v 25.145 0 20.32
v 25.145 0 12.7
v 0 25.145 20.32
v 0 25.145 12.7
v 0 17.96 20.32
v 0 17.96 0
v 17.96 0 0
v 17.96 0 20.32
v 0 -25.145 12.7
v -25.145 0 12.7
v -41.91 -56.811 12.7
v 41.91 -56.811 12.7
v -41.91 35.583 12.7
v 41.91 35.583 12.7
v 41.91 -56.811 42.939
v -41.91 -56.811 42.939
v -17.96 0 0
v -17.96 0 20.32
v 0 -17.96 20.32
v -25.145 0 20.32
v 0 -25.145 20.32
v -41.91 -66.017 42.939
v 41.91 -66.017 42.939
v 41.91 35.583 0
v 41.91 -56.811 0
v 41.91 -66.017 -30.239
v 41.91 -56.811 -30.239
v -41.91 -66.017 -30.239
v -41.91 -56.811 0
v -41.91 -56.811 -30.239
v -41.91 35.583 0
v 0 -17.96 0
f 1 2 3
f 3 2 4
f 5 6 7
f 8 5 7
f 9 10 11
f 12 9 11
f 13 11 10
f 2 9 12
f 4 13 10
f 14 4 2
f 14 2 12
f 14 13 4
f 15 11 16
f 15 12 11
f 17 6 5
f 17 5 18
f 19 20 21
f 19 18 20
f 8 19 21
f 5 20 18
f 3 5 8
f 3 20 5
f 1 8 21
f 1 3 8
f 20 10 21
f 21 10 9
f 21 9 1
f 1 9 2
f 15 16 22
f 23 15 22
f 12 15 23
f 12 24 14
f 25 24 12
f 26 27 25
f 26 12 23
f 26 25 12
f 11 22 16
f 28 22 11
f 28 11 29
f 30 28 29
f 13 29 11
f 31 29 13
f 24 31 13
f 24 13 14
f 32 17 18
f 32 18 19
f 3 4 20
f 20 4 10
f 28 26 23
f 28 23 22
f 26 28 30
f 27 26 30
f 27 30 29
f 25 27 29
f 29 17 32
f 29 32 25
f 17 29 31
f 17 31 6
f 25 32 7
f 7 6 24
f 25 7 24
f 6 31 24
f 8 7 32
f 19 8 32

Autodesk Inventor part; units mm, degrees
ref_plane "YZ Plane" through (0, 0, 0) normal (1, 0, 0) x (0, 1, 0)
ref_plane "XZ Plane" through (0, 0, 0) normal (0, 1, 0) x (-1, 0, 0)
ref_plane "XY Plane" through (0, 0, 0) normal (0, 0, 1) x (1, 0, 0)
sketch "Sketch1" plane through (0, 0, 0) normal (0, 0, 1) x (1, 0, 0)
  line L0 (0, 17.9605) -> (17.9605, 0) construction
  line L1 (17.9605, 0) -> (0, -17.9605) construction
  line L2 (0, -17.9605) -> (-17.9605, 0) construction
  line L3 (-17.9605, 0) -> (0, 17.9605) construction
  line L4 (0, 17.9605) -> (0, -17.9605) construction
  line L5 (17.9605, 0) -> (-17.9605, 0) construction
  line L6 (0, 17.9605) -> (-17.9605, 0)
  line L7 (0, -86.3372) -> (0, 55.9028) projected
  line L8 (-58.674, 0) -> (58.674, 0) projected
  line L9 (0, 17.9605) -> (17.9605, 0)
  line L10 (17.9605, 0) -> (0, -17.9605)
  line L11 (-17.9605, 0) -> (0, -17.9605)
  line L12 (0, 25.1447) -> (-25.1447, 0)
  line L13 (-25.1447, 0) -> (0, -25.1447)
  line L14 (0, -25.1447) -> (25.1447, 0)
  line L15 (25.1447, 0) -> (0, 25.1447)
  line L16 (-41.91, 35.5828) -> (41.91, 35.5828)
  line L17 (41.91, 35.5828) -> (41.91, -66.0172)
  line L18 (41.91, -66.0172) -> (-41.91, -66.0172)
  line L19 (-41.91, -66.0172) -> (-41.91, 35.5828)
  point P0 (0, 0)
  point P1 (0, 0)
  point P2 (0, 0)
  point P3 (0, 0)
  point P4 (0, 0)
  point P5 (29.7157, 21.8287)
  point P6 (0, 35.5828)
  dimension "d0" = 25.4
  dimension "d1" = 25.4
  dimension "d5" = 0
  dimension "d6" = 5.08
  dimension "d7" = 5.08
  dimension "d15" = 83.82
  dimension "d16" = 101.6
extrude "Extrusion2" add sketch "Sketch1" along normal blind 20.32 contours L6 L8 L12 L7 | L7 L15 L8 L9 | L11 L7 L13 L8 | L8 L14 L7 L10
extrude "Extrusion3" add sketch "Sketch1" along normal blind 12.7 contours L12 L8 L19 L16 L7 | L7 L16 L17 L8 L15 | L13 L7 L18 L19 L8 | L8 L17 L18 L7 L14
sketch "Sketch2" plane through (41.91, -66.0172, 0) normal (1, 0, 0) x (0, 0, -1)
  line L0 (0, 0) -> (0, 101.6) projected
  line L1 (0, 101.6) -> (-12.7, 101.6) projected
  line L2 (-12.7, 0) -> (-12.7, 101.6) projected
  line L3 (0, 0) -> (-12.7, 0) projected
  line L4 (-42.9388, 0) -> (30.2388, 0)
  line L5 (30.2388, 0) -> (30.2388, 9.2066)
  line L6 (30.2388, 9.2066) -> (-42.9388, 9.2066)
  line L7 (-42.9388, 9.2066) -> (-42.9388, 0)
  line L8 (-42.9388, 0) -> (30.2388, 9.2066) construction
  line L9 (30.2388, 0) -> (-42.9388, 9.2066) construction
  point P0 (0, 66.0172)
  point P1 (-6.35, 4.6033)
  point P2 (-6.35, 0)
extrude "Extrusion4" add sketch "Sketch2" against normal up to surface (83.82 mm away) contours L3 L2 L6 L0 | L0 L6 L5 L4 | L4 L7 L6 L2
equation "\"d7\" = d6"
properties part number "base_end_mounts" material "ABS Plastic"
